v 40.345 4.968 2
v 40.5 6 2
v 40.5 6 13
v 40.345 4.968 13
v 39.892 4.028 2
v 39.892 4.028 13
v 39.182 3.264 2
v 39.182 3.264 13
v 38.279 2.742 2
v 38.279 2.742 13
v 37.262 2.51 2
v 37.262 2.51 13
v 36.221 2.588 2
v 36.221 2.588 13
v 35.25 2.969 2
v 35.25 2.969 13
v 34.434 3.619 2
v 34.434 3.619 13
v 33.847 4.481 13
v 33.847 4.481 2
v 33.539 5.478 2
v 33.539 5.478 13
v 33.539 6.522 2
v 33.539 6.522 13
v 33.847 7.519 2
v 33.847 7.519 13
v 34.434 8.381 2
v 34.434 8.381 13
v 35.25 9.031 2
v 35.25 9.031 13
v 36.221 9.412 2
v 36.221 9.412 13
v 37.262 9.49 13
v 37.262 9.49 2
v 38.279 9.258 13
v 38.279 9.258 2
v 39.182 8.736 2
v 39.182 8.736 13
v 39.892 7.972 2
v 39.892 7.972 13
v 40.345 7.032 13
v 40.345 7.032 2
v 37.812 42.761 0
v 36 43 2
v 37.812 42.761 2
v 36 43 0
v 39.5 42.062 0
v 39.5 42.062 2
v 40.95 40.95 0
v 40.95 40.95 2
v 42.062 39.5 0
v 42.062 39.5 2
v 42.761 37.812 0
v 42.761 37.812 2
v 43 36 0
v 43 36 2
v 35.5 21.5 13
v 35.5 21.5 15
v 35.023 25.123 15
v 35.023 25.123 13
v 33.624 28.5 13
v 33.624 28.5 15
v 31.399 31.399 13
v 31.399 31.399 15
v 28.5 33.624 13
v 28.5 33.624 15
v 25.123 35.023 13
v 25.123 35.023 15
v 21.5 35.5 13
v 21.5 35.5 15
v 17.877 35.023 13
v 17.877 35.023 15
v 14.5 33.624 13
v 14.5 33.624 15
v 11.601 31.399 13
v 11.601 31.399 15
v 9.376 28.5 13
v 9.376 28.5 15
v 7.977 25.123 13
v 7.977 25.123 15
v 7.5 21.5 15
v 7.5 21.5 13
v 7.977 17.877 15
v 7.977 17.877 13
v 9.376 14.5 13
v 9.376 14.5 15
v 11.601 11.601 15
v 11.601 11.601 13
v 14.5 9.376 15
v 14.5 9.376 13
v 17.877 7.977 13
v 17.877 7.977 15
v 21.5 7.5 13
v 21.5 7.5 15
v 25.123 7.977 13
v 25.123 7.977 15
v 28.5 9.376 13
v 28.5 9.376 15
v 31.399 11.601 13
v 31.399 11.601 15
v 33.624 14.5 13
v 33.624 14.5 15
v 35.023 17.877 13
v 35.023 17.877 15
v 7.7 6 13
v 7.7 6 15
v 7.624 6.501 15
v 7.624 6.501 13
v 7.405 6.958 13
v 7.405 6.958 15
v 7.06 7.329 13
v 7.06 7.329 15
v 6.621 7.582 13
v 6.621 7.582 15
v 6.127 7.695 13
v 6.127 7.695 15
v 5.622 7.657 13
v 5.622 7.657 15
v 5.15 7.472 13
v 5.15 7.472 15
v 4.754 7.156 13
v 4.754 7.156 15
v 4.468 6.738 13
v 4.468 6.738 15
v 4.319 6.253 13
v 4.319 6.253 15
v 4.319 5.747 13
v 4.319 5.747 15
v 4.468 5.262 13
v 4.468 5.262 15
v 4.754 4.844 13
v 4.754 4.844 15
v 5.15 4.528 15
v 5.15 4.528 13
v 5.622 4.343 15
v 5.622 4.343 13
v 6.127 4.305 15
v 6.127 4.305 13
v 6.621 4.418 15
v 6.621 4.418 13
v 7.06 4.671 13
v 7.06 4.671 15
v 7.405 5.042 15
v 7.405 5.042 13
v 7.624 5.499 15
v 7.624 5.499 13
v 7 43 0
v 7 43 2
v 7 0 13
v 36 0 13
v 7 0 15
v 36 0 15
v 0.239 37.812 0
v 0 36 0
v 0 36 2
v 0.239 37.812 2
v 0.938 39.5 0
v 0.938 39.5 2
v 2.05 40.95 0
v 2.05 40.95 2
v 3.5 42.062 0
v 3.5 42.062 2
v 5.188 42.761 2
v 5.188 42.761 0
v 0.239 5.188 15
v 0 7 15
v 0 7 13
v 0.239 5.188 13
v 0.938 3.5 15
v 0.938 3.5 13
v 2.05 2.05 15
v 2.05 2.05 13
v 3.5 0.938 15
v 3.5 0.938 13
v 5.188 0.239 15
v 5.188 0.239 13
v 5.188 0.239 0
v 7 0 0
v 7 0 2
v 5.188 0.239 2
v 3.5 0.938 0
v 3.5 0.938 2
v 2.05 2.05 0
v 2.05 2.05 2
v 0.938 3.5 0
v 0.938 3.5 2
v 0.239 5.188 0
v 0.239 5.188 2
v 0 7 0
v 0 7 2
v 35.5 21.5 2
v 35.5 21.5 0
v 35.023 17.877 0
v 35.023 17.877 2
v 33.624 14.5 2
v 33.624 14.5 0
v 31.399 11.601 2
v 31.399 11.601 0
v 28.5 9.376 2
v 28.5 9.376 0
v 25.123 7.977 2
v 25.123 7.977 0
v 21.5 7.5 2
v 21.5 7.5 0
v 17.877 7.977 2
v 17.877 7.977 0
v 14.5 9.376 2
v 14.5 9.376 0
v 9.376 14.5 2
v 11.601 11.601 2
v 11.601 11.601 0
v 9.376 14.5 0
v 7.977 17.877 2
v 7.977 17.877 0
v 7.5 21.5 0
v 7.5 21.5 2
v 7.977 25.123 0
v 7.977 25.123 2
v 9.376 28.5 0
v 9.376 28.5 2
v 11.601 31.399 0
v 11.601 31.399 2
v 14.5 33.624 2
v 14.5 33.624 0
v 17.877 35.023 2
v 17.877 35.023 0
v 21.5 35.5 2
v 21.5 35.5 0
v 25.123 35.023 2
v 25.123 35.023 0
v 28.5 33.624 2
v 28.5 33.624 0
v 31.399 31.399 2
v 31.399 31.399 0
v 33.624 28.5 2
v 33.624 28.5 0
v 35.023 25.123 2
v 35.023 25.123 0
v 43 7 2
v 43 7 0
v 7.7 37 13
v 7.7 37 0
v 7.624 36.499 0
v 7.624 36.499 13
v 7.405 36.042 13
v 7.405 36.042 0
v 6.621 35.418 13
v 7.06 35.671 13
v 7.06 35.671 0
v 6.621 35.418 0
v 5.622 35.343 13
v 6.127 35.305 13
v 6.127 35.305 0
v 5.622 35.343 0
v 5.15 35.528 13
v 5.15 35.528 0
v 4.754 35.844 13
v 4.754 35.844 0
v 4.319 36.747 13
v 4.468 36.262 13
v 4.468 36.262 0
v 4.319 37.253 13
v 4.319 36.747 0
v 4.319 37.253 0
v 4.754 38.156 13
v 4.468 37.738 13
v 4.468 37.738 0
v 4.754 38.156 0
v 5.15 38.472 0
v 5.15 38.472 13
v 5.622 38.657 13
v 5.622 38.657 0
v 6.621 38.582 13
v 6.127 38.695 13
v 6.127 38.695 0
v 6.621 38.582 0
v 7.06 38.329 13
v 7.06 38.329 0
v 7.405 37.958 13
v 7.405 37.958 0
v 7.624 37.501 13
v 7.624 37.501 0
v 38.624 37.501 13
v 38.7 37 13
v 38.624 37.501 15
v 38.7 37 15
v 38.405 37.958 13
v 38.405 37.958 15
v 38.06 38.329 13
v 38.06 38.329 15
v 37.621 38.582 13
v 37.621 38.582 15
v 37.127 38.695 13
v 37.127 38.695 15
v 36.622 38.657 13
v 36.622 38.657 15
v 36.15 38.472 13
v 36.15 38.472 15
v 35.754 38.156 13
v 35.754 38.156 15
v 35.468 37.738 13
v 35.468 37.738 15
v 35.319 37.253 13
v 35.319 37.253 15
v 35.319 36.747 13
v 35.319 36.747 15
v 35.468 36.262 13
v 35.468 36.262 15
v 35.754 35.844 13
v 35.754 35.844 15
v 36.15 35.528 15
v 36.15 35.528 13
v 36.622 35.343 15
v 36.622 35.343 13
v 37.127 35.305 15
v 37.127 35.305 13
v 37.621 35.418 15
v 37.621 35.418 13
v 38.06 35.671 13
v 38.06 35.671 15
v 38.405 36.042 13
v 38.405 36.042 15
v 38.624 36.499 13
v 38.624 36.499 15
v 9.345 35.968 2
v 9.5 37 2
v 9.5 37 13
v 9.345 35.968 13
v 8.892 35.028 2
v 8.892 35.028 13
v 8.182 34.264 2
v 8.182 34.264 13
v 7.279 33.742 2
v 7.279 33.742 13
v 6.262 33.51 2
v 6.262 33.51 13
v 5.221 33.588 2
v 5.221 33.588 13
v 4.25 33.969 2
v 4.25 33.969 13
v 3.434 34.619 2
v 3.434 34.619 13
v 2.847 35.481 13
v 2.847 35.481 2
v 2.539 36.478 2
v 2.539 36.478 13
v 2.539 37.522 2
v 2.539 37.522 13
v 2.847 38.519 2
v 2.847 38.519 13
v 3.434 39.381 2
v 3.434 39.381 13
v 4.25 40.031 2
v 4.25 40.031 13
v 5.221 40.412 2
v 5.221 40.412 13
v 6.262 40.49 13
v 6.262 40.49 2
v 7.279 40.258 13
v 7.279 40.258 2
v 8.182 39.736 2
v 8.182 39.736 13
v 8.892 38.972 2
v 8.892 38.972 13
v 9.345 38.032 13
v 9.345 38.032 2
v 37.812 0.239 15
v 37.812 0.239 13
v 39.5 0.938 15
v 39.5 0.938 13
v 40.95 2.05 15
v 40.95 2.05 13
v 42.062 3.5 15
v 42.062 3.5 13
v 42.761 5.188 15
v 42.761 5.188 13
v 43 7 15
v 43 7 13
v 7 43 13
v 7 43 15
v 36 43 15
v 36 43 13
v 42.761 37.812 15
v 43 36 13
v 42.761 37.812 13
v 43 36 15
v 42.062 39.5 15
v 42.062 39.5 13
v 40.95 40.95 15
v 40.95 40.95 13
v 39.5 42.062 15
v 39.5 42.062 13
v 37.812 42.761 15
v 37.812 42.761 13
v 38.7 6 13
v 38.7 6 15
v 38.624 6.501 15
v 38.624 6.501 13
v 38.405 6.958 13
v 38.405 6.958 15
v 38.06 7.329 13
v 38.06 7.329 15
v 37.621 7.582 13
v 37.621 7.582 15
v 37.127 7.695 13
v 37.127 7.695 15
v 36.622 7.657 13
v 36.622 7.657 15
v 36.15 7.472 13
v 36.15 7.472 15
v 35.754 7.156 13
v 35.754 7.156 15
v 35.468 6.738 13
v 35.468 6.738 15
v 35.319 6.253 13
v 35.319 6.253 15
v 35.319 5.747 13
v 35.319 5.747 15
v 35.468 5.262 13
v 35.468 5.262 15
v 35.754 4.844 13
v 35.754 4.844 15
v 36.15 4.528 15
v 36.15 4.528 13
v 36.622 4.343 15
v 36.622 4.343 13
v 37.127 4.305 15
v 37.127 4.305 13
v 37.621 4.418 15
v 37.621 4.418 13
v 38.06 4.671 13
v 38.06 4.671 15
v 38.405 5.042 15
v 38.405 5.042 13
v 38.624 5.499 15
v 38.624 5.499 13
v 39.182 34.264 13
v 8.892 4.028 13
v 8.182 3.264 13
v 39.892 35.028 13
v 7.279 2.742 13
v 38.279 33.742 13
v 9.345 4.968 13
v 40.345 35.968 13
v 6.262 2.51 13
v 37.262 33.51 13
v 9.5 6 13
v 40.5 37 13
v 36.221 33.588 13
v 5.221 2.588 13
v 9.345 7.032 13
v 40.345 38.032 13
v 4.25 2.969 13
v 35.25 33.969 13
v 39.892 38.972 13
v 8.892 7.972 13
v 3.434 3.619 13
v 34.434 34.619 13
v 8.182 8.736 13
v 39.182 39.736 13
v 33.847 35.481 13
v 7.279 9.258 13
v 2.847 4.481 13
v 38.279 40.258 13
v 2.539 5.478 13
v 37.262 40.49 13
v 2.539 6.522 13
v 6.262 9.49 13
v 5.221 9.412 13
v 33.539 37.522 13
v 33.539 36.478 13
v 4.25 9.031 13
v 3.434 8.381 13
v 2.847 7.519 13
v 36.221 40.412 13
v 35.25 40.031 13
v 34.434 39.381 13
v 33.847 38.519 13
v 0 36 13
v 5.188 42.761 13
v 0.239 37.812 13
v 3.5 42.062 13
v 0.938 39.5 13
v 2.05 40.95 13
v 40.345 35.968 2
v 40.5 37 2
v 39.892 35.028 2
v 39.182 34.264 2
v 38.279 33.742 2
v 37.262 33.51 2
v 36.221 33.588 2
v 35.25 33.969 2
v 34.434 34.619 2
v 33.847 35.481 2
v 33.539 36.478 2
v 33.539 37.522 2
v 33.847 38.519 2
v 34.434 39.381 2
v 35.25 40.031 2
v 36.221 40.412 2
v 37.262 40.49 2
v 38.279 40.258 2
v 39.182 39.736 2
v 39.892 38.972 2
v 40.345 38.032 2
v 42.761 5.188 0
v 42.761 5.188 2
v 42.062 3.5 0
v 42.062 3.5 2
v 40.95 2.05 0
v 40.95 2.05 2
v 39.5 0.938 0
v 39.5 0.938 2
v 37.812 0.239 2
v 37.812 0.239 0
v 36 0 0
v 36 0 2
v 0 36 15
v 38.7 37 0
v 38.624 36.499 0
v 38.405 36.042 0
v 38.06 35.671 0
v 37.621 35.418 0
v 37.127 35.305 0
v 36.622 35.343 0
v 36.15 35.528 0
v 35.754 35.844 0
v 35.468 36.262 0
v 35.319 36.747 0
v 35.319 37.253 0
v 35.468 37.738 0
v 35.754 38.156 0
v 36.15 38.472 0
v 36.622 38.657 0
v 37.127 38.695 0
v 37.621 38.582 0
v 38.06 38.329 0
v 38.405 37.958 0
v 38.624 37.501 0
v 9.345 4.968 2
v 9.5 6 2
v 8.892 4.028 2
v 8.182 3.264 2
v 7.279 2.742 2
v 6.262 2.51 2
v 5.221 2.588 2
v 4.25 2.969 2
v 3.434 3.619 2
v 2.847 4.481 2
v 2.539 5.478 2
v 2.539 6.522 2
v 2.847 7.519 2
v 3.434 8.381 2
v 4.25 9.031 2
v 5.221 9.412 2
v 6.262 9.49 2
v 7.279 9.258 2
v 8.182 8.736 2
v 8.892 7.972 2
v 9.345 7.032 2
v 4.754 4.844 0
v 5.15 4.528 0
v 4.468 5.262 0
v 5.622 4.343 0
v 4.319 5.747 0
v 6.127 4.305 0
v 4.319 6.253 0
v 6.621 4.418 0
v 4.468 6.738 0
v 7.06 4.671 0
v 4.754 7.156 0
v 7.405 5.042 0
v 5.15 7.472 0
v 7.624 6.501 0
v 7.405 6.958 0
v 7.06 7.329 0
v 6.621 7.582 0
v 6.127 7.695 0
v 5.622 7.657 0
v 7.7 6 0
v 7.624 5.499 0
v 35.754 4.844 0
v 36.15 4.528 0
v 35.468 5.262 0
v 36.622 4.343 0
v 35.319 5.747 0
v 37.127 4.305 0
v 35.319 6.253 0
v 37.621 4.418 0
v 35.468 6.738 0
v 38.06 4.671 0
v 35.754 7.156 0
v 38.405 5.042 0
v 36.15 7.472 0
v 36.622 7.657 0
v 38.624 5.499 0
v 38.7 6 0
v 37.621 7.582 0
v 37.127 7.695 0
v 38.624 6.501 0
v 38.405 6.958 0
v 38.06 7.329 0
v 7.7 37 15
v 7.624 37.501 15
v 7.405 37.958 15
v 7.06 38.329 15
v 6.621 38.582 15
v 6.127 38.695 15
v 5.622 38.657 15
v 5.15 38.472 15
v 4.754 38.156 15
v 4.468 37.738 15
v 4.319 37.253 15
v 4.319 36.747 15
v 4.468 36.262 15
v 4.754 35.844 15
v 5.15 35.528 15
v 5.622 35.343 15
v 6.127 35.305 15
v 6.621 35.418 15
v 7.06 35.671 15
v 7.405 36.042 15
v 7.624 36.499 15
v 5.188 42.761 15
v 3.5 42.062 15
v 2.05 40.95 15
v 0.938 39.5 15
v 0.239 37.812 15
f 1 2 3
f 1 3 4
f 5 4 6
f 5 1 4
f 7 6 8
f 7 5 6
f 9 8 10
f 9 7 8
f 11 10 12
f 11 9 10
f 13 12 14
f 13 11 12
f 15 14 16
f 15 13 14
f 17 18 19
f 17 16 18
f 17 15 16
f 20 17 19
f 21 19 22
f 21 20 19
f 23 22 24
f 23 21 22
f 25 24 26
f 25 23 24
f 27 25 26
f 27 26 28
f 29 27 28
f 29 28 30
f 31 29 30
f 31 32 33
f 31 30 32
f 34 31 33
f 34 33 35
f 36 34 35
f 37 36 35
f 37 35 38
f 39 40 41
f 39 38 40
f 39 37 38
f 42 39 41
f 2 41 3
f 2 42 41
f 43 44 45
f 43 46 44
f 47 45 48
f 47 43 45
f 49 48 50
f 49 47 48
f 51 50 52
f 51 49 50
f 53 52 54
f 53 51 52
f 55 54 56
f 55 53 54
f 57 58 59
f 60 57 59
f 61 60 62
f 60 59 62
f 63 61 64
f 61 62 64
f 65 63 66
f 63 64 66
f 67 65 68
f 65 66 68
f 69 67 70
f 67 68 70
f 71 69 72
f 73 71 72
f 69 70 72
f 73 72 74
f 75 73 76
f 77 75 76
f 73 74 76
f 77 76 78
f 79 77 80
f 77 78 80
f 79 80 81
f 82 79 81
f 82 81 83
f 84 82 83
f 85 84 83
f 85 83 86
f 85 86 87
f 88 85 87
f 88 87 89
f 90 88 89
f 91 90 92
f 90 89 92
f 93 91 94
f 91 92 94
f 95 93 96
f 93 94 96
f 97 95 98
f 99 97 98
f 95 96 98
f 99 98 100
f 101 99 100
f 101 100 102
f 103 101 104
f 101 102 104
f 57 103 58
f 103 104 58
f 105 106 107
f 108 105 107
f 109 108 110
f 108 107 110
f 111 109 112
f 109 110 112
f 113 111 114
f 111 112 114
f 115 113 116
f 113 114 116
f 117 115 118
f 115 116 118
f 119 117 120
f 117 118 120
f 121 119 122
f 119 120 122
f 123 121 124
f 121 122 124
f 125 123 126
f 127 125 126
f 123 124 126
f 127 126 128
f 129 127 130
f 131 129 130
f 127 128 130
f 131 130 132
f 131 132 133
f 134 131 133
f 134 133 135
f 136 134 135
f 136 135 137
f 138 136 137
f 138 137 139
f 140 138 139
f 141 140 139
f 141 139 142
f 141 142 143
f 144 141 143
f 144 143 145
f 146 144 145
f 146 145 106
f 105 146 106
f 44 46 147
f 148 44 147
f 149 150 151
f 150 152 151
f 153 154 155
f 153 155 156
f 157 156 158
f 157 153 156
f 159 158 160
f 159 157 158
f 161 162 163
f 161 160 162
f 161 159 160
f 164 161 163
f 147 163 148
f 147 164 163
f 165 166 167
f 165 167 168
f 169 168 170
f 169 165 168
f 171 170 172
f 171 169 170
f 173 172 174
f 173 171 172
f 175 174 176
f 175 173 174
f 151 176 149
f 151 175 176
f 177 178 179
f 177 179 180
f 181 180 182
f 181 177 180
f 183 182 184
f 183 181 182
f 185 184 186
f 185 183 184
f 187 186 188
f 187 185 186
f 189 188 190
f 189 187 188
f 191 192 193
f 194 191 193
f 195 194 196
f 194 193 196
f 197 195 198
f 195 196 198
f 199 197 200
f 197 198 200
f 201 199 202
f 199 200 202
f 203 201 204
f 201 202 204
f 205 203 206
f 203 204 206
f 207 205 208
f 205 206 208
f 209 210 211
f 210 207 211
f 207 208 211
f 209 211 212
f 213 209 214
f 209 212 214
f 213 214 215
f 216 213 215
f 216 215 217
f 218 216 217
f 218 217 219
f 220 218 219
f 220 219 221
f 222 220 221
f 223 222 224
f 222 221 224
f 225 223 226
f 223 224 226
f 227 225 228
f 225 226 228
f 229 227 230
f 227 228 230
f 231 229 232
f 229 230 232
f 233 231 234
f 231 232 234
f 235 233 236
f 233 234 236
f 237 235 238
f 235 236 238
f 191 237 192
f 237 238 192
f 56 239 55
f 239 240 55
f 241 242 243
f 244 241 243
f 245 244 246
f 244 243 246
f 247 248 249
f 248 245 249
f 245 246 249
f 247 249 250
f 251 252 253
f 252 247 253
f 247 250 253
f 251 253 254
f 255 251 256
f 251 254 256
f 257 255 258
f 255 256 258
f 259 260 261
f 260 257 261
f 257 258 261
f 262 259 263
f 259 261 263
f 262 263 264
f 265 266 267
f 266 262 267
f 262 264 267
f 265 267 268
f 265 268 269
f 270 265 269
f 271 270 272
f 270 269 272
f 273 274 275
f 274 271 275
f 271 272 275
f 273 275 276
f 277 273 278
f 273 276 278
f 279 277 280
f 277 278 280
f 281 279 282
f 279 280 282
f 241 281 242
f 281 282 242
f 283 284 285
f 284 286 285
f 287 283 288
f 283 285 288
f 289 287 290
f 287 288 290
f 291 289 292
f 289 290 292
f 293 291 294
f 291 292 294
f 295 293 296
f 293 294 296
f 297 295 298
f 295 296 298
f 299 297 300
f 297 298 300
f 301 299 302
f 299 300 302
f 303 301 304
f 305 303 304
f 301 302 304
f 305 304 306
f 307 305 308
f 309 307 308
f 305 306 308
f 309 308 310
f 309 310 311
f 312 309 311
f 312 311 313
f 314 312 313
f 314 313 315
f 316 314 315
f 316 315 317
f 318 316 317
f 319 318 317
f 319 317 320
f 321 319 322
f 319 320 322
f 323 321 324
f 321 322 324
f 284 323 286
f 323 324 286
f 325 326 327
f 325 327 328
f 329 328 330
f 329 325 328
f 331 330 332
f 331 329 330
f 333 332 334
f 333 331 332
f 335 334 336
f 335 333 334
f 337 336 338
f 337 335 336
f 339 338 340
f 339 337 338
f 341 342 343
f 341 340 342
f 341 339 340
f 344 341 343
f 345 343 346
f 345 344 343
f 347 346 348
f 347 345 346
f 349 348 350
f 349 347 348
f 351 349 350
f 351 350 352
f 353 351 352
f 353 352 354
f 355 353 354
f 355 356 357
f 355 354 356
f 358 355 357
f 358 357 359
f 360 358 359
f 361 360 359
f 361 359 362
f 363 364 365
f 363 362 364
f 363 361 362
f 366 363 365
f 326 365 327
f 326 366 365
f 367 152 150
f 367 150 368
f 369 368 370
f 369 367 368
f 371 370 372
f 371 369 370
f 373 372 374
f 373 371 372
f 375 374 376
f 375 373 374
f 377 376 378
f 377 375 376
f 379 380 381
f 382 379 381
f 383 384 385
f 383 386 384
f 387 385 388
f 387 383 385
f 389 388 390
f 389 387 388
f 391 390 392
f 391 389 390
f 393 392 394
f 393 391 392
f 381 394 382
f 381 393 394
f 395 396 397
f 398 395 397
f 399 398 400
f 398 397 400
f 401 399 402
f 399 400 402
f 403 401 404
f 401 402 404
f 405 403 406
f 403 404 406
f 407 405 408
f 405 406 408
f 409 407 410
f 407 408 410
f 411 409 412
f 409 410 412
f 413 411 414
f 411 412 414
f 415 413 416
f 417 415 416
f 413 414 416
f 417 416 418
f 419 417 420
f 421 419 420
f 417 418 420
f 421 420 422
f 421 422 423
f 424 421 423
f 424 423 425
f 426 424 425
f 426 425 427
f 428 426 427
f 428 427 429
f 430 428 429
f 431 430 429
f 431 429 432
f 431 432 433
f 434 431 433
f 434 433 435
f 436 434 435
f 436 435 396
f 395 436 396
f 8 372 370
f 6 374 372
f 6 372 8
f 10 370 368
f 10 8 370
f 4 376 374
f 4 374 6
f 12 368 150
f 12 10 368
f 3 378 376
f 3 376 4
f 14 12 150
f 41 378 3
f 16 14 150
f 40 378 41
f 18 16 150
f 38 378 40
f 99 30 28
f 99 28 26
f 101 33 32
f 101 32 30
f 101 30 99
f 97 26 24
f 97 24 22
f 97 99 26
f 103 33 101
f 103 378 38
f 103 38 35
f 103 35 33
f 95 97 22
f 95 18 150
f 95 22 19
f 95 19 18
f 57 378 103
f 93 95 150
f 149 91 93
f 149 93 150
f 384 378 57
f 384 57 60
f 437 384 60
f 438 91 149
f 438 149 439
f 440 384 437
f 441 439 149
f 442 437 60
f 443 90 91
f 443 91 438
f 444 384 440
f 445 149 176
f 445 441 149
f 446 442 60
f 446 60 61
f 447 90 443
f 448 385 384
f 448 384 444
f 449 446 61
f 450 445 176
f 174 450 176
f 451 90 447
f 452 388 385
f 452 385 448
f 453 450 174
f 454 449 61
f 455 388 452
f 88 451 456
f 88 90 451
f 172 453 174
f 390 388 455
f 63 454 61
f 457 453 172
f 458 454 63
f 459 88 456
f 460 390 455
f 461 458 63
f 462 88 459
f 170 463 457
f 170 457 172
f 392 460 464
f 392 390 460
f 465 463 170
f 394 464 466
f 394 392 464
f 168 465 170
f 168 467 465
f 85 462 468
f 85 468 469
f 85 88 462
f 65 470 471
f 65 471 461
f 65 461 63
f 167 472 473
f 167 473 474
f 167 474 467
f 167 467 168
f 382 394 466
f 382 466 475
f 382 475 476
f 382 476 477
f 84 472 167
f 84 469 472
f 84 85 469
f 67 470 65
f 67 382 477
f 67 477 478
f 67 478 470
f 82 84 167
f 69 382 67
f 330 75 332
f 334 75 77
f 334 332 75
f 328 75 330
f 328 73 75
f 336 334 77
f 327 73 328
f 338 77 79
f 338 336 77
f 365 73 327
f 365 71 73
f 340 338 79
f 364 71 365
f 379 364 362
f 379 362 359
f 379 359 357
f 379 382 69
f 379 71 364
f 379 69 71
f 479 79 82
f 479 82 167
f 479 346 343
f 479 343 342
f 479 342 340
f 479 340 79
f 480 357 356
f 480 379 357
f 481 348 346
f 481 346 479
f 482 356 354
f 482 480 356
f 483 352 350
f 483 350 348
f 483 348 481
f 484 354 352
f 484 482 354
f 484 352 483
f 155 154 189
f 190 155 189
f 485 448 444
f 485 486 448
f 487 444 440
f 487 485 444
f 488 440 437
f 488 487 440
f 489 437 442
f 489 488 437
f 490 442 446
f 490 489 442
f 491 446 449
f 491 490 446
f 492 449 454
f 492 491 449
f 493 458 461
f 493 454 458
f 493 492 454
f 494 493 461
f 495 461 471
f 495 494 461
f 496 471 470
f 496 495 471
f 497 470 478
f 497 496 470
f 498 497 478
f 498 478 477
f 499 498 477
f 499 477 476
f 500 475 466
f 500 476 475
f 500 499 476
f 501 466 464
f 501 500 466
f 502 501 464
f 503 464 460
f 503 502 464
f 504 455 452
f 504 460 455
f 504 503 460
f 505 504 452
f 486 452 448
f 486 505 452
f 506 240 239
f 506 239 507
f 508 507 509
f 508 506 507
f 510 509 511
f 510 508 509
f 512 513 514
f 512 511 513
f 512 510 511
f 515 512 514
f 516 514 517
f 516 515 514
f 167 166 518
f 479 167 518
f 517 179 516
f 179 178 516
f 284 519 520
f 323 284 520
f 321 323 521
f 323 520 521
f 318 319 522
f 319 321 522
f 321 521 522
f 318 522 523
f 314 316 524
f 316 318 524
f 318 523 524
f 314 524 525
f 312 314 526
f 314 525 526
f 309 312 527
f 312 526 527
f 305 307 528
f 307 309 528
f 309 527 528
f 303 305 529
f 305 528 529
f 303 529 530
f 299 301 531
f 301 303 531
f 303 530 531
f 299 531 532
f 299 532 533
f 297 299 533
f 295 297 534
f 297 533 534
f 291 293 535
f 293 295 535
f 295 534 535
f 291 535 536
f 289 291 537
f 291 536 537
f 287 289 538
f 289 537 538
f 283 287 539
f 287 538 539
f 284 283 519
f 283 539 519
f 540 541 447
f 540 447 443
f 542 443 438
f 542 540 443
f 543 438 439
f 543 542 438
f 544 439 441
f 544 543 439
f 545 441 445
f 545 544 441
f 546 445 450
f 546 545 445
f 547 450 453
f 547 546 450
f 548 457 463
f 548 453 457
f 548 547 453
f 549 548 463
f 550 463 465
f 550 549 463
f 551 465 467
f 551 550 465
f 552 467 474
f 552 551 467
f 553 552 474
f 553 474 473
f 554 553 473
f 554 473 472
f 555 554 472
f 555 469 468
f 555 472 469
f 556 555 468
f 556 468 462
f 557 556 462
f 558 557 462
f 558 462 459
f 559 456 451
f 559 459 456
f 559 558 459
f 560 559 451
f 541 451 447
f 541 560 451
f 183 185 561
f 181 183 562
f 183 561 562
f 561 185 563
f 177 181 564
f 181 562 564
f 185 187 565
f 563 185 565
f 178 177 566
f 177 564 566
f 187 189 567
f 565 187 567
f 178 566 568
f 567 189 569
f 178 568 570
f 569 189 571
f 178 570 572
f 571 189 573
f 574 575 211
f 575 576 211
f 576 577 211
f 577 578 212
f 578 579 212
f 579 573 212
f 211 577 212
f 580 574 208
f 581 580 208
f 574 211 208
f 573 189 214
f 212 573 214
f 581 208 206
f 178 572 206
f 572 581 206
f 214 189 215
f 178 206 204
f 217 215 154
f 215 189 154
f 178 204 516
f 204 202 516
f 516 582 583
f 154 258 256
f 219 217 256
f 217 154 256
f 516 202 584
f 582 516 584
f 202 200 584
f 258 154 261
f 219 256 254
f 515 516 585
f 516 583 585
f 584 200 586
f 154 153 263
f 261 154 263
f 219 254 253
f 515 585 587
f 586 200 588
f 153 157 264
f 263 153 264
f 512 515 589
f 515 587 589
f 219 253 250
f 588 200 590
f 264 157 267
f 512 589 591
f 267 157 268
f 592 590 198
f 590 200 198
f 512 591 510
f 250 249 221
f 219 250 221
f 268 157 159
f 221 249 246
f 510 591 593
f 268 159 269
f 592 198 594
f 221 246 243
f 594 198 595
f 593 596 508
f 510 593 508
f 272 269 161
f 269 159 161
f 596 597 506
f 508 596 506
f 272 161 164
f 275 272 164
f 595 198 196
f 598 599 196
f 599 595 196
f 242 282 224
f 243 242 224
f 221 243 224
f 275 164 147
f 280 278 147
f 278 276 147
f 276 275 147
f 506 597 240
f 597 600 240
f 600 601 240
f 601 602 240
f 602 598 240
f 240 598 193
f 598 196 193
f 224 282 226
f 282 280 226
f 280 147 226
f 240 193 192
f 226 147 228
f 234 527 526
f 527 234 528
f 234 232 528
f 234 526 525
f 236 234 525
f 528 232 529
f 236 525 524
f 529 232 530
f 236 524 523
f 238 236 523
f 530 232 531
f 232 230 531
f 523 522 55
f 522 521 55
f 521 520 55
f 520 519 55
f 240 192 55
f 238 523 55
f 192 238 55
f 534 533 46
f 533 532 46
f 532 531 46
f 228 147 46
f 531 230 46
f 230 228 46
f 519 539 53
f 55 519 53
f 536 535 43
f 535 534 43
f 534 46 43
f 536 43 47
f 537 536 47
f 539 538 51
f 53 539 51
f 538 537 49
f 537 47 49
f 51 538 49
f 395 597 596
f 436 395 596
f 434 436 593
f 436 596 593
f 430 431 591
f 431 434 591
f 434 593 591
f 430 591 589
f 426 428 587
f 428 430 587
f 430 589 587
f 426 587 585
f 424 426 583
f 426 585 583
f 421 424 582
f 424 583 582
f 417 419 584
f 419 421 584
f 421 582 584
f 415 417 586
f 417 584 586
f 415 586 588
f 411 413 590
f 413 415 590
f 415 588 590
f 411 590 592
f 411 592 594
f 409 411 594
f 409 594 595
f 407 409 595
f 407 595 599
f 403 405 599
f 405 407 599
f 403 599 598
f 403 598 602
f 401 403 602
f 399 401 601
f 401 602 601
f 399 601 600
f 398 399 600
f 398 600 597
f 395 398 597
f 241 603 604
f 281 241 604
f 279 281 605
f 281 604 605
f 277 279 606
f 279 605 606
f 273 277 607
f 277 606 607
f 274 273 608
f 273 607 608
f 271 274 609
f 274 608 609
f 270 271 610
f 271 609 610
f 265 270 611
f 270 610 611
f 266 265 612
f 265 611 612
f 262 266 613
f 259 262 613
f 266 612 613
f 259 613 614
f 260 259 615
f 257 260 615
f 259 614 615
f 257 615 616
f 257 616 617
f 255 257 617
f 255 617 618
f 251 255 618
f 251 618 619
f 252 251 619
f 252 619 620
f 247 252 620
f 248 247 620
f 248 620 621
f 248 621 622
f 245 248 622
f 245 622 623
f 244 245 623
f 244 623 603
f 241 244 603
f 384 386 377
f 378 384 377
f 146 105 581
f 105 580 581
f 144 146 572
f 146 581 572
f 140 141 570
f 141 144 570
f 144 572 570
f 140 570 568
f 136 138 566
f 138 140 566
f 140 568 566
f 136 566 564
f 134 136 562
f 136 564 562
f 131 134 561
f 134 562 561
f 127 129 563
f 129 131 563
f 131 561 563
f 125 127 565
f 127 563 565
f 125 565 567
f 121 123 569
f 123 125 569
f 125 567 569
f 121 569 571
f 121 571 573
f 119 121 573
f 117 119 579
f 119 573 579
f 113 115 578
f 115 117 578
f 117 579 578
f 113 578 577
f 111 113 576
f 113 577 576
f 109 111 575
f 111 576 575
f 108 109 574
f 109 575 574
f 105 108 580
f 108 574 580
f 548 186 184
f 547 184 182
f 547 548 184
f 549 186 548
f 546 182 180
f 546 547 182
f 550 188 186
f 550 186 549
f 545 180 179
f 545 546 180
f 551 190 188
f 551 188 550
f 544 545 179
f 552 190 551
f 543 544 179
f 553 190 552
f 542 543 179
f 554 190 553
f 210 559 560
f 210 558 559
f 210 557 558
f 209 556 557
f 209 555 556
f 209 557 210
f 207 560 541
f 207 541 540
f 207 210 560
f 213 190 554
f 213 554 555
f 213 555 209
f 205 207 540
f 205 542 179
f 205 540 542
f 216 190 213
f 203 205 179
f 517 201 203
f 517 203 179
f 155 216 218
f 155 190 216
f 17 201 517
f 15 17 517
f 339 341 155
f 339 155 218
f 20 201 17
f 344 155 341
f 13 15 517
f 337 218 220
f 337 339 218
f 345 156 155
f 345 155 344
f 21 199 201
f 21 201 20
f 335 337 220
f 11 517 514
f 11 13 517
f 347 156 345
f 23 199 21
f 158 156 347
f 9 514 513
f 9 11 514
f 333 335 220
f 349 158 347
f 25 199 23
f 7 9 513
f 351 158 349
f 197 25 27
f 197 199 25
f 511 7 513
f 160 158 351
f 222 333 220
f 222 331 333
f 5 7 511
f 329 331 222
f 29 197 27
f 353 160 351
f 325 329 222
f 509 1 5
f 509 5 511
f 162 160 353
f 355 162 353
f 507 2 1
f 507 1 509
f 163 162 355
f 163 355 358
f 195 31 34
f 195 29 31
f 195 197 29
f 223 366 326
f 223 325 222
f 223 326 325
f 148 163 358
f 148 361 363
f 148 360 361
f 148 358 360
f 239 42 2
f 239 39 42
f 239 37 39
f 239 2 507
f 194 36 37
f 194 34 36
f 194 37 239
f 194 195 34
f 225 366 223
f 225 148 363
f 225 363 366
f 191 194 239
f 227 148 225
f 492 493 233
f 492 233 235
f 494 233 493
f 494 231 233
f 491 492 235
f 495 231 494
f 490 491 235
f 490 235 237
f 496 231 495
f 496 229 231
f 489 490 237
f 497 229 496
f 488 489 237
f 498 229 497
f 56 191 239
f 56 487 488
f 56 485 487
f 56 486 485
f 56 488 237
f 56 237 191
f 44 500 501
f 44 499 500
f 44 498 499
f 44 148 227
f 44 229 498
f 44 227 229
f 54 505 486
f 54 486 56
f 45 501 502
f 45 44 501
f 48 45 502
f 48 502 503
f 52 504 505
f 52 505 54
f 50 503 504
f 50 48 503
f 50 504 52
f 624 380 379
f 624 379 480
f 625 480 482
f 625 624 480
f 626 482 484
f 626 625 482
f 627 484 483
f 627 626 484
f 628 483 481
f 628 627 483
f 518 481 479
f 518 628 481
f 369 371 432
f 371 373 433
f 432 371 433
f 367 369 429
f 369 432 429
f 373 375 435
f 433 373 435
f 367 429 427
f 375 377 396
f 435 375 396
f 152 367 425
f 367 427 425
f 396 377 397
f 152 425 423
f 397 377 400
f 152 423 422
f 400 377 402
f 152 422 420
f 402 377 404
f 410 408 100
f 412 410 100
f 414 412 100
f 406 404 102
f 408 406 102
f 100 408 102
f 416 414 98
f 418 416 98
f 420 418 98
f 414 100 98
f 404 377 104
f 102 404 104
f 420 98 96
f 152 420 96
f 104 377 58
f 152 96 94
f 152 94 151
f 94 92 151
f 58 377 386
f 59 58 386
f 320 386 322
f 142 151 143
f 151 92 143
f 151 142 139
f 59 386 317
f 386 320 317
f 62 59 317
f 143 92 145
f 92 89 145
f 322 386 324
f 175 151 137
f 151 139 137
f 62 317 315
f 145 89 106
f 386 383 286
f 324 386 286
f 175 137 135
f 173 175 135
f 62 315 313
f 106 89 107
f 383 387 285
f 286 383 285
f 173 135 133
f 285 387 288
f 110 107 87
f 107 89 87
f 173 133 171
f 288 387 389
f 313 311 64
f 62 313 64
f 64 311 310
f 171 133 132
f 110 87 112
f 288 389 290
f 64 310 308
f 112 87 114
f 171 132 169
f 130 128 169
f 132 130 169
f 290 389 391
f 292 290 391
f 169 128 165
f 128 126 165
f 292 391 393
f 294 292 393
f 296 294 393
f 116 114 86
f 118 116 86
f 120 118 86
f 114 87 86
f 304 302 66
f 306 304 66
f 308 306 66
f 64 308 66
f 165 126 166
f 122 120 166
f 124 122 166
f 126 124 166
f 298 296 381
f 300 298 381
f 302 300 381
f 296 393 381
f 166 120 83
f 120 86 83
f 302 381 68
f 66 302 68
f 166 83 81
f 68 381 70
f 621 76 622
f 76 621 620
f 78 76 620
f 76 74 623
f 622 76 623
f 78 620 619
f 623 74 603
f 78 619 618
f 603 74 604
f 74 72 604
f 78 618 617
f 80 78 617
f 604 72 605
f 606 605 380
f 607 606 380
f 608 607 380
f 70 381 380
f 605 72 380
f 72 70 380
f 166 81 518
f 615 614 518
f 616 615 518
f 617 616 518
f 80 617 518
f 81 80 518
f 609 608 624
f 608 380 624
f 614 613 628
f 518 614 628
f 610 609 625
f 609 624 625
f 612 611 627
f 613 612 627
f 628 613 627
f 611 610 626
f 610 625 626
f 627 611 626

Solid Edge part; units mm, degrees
sketch "Sketch1" plane through (0, 0, 0) normal (0, 0, 1) x (1, 0, 0)
  line L0 (7, 0) -> (36, 0)
  arc A0 (36, 0) -> (43, 7) centre (36, 7) ccw
  line L1 (43, 7) -> (43, 36)
  arc A1 (43, 36) -> (36, 43) centre (36, 36) ccw
  line L2 (36, 43) -> (7, 43)
  arc A2 (7, 43) -> (0, 36) centre (7, 36) ccw
  line L3 (0, 36) -> (0, 7)
  arc A3 (7, 0) -> (0, 7) centre (7, 7) cw
  circle A4 centre (21.5, 21.5) radius 14
  circle A5 centre (6, 37) radius 1.7
  circle A6 centre (37, 37) radius 1.7
  circle A7 centre (6, 6) radius 1.7
  circle A8 centre (37, 6) radius 1.7
extrude "Protrusion1" add sketch "Sketch1" along normal blind 2
sketch "Sketch2" plane through (21.5, 21.5, 2) normal (0, 0, 1) x (1, 0, 0)
  circle A0 centre (-15.5, -15.5) radius 3.5
  circle A1 centre (-15.5, 15.5) radius 3.5
  circle A2 centre (15.5, 15.5) radius 3.5
  circle A3 centre (15.5, -15.5) radius 3.5
  circle A4 centre (-15.5, 15.5) radius 1.7
  circle A5 centre (15.5, 15.5) radius 1.7
  circle A6 centre (-15.5, -15.5) radius 1.7
  circle A7 centre (15.5, -15.5) radius 1.7
extrude "ExtrudedProtrusion_2" add sketch "Sketch2" along normal blind 11
mirror "Mirror1" about plane through (21.5, 21.5, 7.5) normal (0, 0, -1) of "Protrusion1"
